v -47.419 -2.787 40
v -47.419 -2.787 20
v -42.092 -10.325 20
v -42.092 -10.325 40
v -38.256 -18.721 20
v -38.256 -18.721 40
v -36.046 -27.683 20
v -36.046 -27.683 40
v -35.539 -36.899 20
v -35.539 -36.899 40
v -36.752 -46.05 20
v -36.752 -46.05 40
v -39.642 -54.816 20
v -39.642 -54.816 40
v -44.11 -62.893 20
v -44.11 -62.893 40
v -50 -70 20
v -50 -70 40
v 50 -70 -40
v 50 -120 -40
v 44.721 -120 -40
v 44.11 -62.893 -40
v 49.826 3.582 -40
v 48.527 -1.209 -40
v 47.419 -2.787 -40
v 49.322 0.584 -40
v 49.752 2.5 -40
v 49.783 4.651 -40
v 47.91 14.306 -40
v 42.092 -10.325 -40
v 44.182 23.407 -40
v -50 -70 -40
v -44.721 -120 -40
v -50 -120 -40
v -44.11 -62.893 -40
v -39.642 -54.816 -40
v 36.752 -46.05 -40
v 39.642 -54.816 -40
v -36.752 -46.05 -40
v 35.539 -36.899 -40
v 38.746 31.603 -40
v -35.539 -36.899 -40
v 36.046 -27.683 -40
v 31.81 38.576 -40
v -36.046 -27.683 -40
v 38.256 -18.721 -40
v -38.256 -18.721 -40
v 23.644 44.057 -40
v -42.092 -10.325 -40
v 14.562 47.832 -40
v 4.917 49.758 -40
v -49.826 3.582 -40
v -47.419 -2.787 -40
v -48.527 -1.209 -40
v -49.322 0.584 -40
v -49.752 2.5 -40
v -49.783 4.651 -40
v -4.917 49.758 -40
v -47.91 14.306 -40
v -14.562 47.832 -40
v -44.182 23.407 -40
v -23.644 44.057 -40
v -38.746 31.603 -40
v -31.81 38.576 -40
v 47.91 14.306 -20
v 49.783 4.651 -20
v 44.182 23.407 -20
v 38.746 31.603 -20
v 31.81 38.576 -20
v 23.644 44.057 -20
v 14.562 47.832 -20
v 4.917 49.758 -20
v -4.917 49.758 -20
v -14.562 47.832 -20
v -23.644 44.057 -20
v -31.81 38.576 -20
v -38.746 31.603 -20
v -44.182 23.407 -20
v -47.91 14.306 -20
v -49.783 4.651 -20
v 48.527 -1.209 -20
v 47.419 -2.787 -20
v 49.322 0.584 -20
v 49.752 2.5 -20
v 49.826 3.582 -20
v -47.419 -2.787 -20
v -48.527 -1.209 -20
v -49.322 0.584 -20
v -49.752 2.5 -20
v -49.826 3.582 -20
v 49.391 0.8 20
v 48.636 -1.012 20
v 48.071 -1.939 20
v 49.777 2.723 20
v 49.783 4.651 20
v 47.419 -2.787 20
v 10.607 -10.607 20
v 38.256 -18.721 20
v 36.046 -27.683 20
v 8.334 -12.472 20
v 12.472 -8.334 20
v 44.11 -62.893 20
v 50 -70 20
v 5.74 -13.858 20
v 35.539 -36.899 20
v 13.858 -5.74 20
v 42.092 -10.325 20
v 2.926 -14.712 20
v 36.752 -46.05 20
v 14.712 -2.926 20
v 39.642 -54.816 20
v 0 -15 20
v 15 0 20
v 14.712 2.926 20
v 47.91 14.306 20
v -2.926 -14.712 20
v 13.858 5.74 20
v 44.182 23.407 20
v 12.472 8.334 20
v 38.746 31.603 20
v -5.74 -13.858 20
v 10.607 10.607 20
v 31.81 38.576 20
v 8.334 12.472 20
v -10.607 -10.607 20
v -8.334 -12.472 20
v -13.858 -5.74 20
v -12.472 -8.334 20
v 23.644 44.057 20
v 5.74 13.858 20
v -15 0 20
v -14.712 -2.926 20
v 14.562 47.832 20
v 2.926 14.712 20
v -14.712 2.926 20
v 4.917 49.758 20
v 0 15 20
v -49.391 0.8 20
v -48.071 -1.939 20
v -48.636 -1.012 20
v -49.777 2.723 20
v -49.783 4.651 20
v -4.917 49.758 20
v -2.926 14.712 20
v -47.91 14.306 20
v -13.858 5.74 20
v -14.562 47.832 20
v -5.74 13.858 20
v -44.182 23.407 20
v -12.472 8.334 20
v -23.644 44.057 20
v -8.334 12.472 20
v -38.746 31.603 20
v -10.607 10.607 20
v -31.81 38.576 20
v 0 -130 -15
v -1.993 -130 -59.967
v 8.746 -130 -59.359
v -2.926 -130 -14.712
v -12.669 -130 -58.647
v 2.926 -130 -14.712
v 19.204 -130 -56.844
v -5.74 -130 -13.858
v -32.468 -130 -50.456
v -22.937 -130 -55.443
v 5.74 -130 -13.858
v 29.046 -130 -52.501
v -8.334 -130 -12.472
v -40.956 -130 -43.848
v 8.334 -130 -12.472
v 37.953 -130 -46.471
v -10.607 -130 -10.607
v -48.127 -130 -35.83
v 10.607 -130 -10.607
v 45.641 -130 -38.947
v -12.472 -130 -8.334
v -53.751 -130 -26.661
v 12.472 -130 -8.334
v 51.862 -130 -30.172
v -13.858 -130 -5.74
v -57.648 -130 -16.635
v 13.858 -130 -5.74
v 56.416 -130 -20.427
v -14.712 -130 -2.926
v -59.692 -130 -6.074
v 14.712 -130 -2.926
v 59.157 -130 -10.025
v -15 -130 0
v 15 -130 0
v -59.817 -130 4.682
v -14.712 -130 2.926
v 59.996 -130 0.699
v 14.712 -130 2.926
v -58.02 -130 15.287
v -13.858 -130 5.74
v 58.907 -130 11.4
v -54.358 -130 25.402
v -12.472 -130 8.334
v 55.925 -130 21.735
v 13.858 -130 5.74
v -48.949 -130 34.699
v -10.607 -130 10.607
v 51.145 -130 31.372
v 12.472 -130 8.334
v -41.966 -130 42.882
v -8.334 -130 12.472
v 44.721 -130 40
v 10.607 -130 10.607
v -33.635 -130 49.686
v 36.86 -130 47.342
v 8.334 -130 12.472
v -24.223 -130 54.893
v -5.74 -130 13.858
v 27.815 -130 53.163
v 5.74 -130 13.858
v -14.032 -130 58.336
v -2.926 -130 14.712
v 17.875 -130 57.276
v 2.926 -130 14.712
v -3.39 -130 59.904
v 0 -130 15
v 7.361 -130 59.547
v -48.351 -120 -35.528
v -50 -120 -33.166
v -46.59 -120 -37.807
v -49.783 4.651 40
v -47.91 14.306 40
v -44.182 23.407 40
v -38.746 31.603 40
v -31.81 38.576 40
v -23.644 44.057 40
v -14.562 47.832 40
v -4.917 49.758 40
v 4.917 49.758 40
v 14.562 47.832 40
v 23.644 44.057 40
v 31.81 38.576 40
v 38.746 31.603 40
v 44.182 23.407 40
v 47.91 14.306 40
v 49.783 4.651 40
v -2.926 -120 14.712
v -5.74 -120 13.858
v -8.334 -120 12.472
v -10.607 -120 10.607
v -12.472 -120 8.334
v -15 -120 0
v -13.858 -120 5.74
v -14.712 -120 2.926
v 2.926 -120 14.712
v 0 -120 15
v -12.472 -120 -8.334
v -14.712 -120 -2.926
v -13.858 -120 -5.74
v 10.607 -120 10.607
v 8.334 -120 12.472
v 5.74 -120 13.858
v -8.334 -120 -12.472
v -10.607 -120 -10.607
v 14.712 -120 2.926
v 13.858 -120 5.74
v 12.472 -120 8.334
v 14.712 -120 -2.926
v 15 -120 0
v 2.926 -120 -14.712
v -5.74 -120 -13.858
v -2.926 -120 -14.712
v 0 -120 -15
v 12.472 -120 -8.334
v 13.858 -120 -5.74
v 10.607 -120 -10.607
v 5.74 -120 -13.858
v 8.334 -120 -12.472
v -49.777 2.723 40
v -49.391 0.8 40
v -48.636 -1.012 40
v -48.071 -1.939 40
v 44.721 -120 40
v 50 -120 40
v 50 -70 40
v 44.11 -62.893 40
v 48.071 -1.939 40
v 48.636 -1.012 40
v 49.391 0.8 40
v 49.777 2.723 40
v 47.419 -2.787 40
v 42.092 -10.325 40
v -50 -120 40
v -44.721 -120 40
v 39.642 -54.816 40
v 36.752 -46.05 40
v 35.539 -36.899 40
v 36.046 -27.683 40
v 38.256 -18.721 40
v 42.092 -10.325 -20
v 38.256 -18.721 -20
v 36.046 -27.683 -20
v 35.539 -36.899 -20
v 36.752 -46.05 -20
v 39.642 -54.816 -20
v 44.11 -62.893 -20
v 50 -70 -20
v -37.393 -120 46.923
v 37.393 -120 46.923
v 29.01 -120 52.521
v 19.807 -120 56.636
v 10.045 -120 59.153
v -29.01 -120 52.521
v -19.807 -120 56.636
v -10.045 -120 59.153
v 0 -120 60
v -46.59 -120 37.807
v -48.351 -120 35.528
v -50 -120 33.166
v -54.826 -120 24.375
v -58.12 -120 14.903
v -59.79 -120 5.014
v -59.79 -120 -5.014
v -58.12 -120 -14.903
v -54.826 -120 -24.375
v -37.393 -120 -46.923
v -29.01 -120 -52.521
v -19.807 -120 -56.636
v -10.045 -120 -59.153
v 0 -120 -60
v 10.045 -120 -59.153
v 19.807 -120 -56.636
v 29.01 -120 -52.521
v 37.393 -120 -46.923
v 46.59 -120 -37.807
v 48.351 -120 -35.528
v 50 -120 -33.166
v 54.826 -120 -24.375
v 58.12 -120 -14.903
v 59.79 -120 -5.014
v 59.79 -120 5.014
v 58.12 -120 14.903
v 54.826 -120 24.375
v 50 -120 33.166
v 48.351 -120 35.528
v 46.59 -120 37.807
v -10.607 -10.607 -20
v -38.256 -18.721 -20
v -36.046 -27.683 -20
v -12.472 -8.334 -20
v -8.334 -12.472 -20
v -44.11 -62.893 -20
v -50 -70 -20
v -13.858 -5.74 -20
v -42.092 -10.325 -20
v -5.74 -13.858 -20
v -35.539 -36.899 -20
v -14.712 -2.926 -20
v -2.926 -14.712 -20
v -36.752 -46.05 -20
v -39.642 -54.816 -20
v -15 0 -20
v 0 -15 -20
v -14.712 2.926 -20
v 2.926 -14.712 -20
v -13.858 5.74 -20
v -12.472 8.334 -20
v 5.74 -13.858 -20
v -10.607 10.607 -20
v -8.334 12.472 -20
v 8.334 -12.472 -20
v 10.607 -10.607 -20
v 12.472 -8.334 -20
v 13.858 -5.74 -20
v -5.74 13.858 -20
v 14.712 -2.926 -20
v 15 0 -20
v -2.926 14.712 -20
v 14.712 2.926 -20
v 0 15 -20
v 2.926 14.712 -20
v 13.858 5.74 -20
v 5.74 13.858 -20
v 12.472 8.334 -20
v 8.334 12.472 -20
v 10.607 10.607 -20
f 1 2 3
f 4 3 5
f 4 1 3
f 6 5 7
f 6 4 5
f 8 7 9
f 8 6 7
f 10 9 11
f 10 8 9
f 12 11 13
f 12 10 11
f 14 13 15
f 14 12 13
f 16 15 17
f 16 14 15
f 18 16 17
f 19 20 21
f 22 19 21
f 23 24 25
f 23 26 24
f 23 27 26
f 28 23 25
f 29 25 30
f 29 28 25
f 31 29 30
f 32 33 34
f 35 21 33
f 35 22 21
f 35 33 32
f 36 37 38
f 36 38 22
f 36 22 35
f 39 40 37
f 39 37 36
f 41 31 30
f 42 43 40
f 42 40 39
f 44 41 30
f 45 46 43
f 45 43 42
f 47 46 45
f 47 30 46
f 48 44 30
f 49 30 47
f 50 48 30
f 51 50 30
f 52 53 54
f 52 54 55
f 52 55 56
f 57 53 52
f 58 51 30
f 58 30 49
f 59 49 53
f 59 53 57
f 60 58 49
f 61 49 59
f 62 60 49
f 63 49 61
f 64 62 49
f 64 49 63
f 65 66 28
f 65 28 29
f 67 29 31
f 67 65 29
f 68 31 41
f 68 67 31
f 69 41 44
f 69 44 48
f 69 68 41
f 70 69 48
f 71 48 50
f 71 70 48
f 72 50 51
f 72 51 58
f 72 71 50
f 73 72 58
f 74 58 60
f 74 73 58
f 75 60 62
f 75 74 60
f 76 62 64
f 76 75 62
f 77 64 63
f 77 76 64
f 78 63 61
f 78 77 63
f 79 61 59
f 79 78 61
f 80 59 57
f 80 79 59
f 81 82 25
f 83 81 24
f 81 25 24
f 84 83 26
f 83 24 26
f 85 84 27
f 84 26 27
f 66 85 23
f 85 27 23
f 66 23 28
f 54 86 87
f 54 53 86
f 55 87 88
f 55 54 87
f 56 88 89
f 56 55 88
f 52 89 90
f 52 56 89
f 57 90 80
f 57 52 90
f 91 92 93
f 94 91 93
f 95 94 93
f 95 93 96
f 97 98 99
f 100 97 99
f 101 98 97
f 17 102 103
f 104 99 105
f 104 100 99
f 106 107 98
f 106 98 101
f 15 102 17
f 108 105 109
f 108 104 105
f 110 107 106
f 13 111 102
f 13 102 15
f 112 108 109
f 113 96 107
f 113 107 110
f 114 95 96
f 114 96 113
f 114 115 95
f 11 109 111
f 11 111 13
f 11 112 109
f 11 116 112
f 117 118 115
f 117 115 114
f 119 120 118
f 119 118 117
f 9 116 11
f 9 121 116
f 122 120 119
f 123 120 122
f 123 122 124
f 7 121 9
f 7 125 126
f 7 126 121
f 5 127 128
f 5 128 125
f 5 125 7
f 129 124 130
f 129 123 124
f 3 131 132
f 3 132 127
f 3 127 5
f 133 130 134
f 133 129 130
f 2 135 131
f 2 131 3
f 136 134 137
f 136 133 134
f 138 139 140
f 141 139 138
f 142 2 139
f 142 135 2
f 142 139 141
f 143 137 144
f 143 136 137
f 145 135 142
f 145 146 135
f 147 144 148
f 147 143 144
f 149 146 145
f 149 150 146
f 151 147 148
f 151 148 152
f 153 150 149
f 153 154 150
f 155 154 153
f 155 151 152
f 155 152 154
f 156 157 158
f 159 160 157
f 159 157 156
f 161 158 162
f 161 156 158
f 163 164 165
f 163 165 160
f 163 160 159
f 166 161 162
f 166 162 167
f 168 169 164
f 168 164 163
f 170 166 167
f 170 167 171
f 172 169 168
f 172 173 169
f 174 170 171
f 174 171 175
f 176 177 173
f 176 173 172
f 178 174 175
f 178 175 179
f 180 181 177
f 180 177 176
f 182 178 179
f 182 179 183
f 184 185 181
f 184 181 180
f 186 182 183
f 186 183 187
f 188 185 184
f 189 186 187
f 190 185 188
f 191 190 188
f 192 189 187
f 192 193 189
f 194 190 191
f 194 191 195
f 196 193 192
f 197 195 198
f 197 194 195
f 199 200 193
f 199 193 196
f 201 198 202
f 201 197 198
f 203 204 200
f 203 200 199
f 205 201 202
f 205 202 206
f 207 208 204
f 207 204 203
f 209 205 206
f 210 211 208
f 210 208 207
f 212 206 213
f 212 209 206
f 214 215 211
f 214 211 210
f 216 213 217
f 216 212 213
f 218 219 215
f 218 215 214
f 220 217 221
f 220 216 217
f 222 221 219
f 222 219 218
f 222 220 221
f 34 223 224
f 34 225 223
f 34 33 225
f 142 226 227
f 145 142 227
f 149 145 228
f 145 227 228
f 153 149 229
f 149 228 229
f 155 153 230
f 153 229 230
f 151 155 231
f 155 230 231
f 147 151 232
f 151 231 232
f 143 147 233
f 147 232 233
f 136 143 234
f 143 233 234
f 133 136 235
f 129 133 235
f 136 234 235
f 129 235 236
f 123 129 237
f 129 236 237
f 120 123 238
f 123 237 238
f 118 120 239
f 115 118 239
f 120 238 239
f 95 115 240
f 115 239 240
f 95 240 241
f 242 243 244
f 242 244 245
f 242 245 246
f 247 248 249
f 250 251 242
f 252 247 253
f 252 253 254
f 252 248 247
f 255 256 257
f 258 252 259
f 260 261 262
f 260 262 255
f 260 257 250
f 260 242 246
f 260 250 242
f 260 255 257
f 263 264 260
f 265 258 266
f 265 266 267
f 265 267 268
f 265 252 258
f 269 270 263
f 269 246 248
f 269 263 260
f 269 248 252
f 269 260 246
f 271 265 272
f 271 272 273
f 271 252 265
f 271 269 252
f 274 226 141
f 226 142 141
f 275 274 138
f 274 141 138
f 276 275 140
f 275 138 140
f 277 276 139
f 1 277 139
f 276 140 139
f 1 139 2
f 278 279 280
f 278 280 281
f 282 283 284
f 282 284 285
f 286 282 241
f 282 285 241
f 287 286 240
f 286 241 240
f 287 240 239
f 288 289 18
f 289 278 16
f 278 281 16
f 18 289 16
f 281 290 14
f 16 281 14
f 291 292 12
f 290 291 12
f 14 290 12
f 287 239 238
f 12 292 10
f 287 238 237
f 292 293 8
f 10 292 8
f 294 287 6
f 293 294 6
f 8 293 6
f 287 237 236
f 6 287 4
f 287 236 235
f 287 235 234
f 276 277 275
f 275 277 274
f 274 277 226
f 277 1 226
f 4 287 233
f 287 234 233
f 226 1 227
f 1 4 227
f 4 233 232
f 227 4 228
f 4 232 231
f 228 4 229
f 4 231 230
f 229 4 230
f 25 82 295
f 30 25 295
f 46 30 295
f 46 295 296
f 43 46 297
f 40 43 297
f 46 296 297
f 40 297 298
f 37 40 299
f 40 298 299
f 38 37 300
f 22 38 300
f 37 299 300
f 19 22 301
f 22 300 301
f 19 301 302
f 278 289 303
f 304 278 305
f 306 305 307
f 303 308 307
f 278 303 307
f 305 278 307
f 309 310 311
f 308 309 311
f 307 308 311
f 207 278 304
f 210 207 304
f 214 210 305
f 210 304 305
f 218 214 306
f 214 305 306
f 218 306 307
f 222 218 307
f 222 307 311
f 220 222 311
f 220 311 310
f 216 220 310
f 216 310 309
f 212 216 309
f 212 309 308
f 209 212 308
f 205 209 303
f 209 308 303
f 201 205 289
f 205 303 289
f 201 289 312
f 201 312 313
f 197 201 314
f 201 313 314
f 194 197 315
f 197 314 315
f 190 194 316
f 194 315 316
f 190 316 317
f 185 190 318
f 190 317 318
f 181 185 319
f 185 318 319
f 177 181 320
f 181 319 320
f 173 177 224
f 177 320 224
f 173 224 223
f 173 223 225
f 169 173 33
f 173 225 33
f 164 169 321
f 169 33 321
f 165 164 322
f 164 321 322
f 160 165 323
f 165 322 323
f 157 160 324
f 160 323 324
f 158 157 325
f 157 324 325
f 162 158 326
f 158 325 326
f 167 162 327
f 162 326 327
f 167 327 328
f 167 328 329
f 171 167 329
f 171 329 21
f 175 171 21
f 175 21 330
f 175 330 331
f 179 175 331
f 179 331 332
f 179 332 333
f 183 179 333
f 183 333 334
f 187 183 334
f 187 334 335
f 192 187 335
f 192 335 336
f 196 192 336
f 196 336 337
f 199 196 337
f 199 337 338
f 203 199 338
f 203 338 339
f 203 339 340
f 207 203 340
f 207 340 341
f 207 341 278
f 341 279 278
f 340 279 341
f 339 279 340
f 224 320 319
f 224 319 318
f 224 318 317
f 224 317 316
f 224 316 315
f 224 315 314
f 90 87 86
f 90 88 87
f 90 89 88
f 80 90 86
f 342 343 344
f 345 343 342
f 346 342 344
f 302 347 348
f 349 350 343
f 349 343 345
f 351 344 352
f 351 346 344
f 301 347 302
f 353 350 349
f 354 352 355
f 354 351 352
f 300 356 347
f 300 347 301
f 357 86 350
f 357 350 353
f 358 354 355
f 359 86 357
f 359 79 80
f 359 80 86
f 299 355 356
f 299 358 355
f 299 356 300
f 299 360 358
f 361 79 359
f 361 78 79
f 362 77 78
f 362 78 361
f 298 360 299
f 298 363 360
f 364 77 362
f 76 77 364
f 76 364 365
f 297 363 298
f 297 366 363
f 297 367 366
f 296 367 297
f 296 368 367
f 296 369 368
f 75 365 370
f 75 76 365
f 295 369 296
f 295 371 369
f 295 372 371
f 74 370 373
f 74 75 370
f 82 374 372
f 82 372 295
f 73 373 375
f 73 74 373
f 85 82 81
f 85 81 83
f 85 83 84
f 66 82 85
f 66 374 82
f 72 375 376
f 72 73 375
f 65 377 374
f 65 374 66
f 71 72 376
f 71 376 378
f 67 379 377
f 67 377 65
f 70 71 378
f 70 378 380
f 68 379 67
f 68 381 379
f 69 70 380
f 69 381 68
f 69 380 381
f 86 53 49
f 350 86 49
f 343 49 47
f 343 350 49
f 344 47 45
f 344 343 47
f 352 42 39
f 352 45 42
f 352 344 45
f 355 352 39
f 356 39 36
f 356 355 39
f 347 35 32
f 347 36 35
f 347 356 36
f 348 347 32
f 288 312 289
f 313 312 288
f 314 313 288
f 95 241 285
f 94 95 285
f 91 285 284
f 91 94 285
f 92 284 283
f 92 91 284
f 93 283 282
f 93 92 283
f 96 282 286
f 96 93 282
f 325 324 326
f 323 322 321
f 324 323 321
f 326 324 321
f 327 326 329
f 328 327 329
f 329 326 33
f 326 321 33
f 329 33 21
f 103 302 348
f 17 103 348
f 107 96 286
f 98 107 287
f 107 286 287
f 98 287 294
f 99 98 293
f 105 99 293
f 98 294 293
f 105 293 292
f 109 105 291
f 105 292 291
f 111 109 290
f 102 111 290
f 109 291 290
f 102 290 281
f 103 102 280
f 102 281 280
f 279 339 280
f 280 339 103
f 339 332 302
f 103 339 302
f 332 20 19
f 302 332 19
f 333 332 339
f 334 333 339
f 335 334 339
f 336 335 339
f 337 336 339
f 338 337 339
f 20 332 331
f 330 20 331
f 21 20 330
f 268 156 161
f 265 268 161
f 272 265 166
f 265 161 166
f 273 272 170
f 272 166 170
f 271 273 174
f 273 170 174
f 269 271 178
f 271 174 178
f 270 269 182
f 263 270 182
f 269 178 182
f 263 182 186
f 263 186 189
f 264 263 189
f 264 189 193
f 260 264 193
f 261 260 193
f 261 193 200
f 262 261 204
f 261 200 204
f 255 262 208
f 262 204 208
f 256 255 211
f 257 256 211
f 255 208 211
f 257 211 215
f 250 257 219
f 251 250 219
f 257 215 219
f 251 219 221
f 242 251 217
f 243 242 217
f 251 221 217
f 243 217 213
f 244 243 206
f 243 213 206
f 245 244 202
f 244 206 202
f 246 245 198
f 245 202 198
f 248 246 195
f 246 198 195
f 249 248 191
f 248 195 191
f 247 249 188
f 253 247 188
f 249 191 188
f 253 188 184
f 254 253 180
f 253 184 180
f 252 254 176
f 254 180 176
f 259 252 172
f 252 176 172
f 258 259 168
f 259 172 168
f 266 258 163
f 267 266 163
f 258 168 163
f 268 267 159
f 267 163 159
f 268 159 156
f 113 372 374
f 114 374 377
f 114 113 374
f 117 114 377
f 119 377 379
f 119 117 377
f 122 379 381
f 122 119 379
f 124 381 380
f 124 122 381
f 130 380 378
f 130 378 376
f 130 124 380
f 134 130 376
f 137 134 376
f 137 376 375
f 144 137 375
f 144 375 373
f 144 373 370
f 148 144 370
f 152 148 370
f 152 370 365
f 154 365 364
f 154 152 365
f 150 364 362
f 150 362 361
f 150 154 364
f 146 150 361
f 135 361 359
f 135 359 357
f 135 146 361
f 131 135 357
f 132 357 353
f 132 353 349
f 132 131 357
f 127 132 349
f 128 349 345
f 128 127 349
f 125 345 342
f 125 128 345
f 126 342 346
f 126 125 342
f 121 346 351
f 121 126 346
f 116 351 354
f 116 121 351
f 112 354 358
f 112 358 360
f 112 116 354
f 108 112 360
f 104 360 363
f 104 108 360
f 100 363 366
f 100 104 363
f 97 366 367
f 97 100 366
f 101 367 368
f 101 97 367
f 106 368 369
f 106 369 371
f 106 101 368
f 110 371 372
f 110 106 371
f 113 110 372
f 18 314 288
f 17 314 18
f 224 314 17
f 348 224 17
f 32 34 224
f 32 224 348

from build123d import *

# Parameters (mm, degrees)
SKETCH1_R           = 15
BOSS_EXTRUDE1_DEPTH = 40
BOSS_EXTRUDE2_DEPTH = 20
BOSS_EXTRUDE3_START = -20
BOSS_EXTRUDE3_DEPTH = 20
SKETCH4_W           = 100
SKETCH4_H           = 50
BOSS_EXTRUDE4_DEPTH = 80
SKETCH5_R           = 60
BOSS_EXTRUDE5_DEPTH = 10
SKETCH6_R           = 15
CUT_EXTRUDE1_DEPTH  = 10
CUT_EXTRUDE2_DEPTH  = 90
CUT_EXTRUDE3_DEPTH  = 90
FILLET2_R           = 10


with BuildPart() as part:
    # Sketch1 → Boss-Extrude1 (new, symmetric)
    with BuildSketch(Plane.XY):
        Circle(SKETCH1_R)
    extrude(amount=BOSS_EXTRUDE1_DEPTH, both=True)

    # Sketch2 → Boss-Extrude2 (add)
    with BuildSketch(Plane.XY.offset(40)):
        with BuildLine():
            Line((50, 0), (50, -70))
            ThreePointArc((50, -70), (0, -120), (-50, -70))
            Line((-50, -70), (-50, 0))
            ThreePointArc((-50, 0), (0, 50), (50, 0))
        make_face()
    extrude(amount=-BOSS_EXTRUDE2_DEPTH)

    # Sketch3 → Boss-Extrude3 (add)
    with BuildSketch(Plane(origin=(0, 0, -40), x_dir=(-1, 0, 0), z_dir=(0, 0, -1)).offset(BOSS_EXTRUDE3_START)):
        with BuildLine():
            Line((50, 0), (50, -70))
            ThreePointArc((50, -70), (0, -120), (-50, -70))
            Line((-50, -70), (-50, 0))
            ThreePointArc((-50, 0), (0, 50), (50, 0))
        make_face()
    extrude(amount=BOSS_EXTRUDE3_DEPTH)

    # Sketch4 → Boss-Extrude4 (add)
    with BuildSketch(Plane(origin=(0, 0, -40), x_dir=(-1, 0, 0), z_dir=(0, 0, -1))):
        with Locations((0, -95)):
            Rectangle(SKETCH4_W, SKETCH4_H)
    extrude(amount=-BOSS_EXTRUDE4_DEPTH)

    # Sketch5 → Boss-Extrude5 (add)
    with BuildSketch(Plane.XZ.offset(120)):
        with Locations(Location((0, 0, 0), (0, 0, 41.810314896))):
            Circle(SKETCH5_R)
    extrude(amount=BOSS_EXTRUDE5_DEPTH)

    # Sketch6 → Cut-Extrude1 (cut)
    with BuildSketch(Plane.XZ.offset(130)):
        with Locations(Location((0, 0, 0), (0, 0, 270))):
            Circle(SKETCH6_R)
    extrude(amount=-CUT_EXTRUDE1_DEPTH, mode=Mode.SUBTRACT)

    # Sketch7 → Cut-Extrude2 (cut)
    with BuildSketch(Plane.XY.offset(40)):
        with BuildLine():
            Line((-50, -70), (-50, 0))
            ThreePointArc((-50, 0), (-35.502525317, -35), (-50, -70))
        make_face()
    extrude(amount=-CUT_EXTRUDE2_DEPTH, mode=Mode.SUBTRACT)

    # Sketch8 → Cut-Extrude3 (cut)
    with BuildSketch(Plane.XY.offset(40)):
        with BuildLine():
            Line((50, -70), (50, 0))
            ThreePointArc((50, 0), (35.502525317, -35), (50, -70))
        make_face()
    extrude(amount=-CUT_EXTRUDE3_DEPTH, mode=Mode.SUBTRACT)

    # Fillet2
    fillet2_edges = [part.edges().sort_by_distance(p)[0] for p in [
        (50, 0, -30),
        (-50, 0, -30),
        (-50, 0, 30),
        (50, 0, 30),
    ]]
    fillet(fillet2_edges, radius=FILLET2_R)


solid = part.part
